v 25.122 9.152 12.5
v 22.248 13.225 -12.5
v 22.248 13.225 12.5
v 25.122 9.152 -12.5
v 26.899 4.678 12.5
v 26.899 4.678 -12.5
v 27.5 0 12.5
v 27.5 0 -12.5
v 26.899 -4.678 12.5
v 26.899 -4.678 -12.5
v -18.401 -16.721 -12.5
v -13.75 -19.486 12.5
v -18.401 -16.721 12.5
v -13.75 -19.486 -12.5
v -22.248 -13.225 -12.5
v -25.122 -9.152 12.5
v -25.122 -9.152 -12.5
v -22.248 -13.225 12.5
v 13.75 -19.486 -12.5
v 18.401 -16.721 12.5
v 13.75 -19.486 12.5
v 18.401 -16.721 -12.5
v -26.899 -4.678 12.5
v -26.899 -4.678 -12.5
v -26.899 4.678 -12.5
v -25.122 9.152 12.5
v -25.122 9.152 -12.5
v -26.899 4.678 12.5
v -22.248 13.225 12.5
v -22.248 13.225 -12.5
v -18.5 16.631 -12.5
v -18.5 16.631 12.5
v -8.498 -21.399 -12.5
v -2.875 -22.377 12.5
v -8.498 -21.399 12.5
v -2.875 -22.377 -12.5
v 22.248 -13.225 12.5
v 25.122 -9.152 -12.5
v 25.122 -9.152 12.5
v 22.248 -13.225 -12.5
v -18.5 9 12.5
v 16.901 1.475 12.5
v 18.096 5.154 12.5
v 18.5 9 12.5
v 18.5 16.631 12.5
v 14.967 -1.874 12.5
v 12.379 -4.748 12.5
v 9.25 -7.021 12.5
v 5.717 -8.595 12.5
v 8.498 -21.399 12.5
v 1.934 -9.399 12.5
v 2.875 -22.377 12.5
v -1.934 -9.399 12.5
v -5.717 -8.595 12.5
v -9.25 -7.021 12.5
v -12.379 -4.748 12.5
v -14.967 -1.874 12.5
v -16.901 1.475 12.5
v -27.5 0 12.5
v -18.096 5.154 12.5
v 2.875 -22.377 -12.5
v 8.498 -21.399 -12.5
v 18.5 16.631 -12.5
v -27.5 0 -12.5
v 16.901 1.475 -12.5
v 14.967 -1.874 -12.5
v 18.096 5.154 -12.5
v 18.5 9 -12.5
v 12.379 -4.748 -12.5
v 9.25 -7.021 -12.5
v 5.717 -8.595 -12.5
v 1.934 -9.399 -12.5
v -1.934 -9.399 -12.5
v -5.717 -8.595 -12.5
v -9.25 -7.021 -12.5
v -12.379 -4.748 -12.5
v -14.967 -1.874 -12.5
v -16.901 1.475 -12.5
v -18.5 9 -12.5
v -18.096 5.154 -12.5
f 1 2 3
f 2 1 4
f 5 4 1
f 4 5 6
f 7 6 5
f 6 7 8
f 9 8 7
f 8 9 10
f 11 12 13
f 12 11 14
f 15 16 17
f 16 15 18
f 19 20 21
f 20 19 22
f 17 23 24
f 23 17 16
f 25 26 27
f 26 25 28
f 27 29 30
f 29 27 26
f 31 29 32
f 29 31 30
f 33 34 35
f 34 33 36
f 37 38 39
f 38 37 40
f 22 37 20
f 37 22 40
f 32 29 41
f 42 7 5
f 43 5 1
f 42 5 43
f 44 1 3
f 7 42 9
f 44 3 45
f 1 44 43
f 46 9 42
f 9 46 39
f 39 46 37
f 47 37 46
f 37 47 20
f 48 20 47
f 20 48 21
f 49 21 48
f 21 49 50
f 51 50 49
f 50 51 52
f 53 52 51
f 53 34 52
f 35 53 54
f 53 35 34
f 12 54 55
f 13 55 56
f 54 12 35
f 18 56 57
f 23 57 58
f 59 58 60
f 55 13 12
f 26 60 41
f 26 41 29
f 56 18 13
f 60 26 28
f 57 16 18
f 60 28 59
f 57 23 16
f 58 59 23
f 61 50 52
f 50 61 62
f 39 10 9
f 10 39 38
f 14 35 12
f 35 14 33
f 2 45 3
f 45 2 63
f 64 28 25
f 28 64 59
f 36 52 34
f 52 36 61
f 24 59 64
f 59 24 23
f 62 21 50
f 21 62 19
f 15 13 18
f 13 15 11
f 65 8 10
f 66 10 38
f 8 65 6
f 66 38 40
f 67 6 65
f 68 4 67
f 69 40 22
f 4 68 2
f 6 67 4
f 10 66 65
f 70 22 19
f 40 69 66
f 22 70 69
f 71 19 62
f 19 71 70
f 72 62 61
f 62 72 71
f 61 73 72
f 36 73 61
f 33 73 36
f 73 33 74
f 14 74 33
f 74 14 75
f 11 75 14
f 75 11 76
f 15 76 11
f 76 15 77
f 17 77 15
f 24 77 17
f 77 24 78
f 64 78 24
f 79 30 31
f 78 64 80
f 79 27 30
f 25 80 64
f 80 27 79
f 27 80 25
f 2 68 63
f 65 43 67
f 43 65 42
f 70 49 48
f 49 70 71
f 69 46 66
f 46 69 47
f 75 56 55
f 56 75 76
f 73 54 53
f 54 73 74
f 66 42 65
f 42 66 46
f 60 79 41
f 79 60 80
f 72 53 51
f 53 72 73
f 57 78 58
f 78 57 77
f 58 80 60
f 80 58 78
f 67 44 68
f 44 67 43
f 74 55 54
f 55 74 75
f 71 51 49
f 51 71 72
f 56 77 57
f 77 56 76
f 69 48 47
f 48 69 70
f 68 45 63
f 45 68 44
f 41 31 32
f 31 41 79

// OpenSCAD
//Handlebar Watch/GPS Holder by eriqjo
//
//v0.2 Moved the mount forward on the handlebar so it can actually be installed
//v0.1 Initial release
//

//CUSTOMIZER VARIABLES

/* [Measurements] */

//How wide is the wrist strap, mm?
Strap_Width = 25;

//Simulated wrist diameter (thickest), mm
Wrist_Dia_A = 55;

//Simulated wrist diameter (thinnest), mm
Wrist_Dia_B = 45;

//Diameter of the handlebar, mm
HB_Diameter = 37;

//END CUSTOMIZER VARIABLES

difference(){
	scale([Wrist_Dia_A, Wrist_Dia_B, 1])
		cylinder(h = Strap_Width, r = 0.5, center = true, $fn = 30);
	translate([0,5 + (Wrist_Dia_B - HB_Diameter)/2, 0])
		cylinder(h = Strap_Width +1, r = HB_Diameter/2, center = true);
	translate([0,5 + (Wrist_Dia_B - HB_Diameter)/2 + (Wrist_Dia_B/2 + 1)/2, 0])
		cube([HB_Diameter, Wrist_Dia_B/2 + 1, Strap_Width +1], center = true);
} //d


